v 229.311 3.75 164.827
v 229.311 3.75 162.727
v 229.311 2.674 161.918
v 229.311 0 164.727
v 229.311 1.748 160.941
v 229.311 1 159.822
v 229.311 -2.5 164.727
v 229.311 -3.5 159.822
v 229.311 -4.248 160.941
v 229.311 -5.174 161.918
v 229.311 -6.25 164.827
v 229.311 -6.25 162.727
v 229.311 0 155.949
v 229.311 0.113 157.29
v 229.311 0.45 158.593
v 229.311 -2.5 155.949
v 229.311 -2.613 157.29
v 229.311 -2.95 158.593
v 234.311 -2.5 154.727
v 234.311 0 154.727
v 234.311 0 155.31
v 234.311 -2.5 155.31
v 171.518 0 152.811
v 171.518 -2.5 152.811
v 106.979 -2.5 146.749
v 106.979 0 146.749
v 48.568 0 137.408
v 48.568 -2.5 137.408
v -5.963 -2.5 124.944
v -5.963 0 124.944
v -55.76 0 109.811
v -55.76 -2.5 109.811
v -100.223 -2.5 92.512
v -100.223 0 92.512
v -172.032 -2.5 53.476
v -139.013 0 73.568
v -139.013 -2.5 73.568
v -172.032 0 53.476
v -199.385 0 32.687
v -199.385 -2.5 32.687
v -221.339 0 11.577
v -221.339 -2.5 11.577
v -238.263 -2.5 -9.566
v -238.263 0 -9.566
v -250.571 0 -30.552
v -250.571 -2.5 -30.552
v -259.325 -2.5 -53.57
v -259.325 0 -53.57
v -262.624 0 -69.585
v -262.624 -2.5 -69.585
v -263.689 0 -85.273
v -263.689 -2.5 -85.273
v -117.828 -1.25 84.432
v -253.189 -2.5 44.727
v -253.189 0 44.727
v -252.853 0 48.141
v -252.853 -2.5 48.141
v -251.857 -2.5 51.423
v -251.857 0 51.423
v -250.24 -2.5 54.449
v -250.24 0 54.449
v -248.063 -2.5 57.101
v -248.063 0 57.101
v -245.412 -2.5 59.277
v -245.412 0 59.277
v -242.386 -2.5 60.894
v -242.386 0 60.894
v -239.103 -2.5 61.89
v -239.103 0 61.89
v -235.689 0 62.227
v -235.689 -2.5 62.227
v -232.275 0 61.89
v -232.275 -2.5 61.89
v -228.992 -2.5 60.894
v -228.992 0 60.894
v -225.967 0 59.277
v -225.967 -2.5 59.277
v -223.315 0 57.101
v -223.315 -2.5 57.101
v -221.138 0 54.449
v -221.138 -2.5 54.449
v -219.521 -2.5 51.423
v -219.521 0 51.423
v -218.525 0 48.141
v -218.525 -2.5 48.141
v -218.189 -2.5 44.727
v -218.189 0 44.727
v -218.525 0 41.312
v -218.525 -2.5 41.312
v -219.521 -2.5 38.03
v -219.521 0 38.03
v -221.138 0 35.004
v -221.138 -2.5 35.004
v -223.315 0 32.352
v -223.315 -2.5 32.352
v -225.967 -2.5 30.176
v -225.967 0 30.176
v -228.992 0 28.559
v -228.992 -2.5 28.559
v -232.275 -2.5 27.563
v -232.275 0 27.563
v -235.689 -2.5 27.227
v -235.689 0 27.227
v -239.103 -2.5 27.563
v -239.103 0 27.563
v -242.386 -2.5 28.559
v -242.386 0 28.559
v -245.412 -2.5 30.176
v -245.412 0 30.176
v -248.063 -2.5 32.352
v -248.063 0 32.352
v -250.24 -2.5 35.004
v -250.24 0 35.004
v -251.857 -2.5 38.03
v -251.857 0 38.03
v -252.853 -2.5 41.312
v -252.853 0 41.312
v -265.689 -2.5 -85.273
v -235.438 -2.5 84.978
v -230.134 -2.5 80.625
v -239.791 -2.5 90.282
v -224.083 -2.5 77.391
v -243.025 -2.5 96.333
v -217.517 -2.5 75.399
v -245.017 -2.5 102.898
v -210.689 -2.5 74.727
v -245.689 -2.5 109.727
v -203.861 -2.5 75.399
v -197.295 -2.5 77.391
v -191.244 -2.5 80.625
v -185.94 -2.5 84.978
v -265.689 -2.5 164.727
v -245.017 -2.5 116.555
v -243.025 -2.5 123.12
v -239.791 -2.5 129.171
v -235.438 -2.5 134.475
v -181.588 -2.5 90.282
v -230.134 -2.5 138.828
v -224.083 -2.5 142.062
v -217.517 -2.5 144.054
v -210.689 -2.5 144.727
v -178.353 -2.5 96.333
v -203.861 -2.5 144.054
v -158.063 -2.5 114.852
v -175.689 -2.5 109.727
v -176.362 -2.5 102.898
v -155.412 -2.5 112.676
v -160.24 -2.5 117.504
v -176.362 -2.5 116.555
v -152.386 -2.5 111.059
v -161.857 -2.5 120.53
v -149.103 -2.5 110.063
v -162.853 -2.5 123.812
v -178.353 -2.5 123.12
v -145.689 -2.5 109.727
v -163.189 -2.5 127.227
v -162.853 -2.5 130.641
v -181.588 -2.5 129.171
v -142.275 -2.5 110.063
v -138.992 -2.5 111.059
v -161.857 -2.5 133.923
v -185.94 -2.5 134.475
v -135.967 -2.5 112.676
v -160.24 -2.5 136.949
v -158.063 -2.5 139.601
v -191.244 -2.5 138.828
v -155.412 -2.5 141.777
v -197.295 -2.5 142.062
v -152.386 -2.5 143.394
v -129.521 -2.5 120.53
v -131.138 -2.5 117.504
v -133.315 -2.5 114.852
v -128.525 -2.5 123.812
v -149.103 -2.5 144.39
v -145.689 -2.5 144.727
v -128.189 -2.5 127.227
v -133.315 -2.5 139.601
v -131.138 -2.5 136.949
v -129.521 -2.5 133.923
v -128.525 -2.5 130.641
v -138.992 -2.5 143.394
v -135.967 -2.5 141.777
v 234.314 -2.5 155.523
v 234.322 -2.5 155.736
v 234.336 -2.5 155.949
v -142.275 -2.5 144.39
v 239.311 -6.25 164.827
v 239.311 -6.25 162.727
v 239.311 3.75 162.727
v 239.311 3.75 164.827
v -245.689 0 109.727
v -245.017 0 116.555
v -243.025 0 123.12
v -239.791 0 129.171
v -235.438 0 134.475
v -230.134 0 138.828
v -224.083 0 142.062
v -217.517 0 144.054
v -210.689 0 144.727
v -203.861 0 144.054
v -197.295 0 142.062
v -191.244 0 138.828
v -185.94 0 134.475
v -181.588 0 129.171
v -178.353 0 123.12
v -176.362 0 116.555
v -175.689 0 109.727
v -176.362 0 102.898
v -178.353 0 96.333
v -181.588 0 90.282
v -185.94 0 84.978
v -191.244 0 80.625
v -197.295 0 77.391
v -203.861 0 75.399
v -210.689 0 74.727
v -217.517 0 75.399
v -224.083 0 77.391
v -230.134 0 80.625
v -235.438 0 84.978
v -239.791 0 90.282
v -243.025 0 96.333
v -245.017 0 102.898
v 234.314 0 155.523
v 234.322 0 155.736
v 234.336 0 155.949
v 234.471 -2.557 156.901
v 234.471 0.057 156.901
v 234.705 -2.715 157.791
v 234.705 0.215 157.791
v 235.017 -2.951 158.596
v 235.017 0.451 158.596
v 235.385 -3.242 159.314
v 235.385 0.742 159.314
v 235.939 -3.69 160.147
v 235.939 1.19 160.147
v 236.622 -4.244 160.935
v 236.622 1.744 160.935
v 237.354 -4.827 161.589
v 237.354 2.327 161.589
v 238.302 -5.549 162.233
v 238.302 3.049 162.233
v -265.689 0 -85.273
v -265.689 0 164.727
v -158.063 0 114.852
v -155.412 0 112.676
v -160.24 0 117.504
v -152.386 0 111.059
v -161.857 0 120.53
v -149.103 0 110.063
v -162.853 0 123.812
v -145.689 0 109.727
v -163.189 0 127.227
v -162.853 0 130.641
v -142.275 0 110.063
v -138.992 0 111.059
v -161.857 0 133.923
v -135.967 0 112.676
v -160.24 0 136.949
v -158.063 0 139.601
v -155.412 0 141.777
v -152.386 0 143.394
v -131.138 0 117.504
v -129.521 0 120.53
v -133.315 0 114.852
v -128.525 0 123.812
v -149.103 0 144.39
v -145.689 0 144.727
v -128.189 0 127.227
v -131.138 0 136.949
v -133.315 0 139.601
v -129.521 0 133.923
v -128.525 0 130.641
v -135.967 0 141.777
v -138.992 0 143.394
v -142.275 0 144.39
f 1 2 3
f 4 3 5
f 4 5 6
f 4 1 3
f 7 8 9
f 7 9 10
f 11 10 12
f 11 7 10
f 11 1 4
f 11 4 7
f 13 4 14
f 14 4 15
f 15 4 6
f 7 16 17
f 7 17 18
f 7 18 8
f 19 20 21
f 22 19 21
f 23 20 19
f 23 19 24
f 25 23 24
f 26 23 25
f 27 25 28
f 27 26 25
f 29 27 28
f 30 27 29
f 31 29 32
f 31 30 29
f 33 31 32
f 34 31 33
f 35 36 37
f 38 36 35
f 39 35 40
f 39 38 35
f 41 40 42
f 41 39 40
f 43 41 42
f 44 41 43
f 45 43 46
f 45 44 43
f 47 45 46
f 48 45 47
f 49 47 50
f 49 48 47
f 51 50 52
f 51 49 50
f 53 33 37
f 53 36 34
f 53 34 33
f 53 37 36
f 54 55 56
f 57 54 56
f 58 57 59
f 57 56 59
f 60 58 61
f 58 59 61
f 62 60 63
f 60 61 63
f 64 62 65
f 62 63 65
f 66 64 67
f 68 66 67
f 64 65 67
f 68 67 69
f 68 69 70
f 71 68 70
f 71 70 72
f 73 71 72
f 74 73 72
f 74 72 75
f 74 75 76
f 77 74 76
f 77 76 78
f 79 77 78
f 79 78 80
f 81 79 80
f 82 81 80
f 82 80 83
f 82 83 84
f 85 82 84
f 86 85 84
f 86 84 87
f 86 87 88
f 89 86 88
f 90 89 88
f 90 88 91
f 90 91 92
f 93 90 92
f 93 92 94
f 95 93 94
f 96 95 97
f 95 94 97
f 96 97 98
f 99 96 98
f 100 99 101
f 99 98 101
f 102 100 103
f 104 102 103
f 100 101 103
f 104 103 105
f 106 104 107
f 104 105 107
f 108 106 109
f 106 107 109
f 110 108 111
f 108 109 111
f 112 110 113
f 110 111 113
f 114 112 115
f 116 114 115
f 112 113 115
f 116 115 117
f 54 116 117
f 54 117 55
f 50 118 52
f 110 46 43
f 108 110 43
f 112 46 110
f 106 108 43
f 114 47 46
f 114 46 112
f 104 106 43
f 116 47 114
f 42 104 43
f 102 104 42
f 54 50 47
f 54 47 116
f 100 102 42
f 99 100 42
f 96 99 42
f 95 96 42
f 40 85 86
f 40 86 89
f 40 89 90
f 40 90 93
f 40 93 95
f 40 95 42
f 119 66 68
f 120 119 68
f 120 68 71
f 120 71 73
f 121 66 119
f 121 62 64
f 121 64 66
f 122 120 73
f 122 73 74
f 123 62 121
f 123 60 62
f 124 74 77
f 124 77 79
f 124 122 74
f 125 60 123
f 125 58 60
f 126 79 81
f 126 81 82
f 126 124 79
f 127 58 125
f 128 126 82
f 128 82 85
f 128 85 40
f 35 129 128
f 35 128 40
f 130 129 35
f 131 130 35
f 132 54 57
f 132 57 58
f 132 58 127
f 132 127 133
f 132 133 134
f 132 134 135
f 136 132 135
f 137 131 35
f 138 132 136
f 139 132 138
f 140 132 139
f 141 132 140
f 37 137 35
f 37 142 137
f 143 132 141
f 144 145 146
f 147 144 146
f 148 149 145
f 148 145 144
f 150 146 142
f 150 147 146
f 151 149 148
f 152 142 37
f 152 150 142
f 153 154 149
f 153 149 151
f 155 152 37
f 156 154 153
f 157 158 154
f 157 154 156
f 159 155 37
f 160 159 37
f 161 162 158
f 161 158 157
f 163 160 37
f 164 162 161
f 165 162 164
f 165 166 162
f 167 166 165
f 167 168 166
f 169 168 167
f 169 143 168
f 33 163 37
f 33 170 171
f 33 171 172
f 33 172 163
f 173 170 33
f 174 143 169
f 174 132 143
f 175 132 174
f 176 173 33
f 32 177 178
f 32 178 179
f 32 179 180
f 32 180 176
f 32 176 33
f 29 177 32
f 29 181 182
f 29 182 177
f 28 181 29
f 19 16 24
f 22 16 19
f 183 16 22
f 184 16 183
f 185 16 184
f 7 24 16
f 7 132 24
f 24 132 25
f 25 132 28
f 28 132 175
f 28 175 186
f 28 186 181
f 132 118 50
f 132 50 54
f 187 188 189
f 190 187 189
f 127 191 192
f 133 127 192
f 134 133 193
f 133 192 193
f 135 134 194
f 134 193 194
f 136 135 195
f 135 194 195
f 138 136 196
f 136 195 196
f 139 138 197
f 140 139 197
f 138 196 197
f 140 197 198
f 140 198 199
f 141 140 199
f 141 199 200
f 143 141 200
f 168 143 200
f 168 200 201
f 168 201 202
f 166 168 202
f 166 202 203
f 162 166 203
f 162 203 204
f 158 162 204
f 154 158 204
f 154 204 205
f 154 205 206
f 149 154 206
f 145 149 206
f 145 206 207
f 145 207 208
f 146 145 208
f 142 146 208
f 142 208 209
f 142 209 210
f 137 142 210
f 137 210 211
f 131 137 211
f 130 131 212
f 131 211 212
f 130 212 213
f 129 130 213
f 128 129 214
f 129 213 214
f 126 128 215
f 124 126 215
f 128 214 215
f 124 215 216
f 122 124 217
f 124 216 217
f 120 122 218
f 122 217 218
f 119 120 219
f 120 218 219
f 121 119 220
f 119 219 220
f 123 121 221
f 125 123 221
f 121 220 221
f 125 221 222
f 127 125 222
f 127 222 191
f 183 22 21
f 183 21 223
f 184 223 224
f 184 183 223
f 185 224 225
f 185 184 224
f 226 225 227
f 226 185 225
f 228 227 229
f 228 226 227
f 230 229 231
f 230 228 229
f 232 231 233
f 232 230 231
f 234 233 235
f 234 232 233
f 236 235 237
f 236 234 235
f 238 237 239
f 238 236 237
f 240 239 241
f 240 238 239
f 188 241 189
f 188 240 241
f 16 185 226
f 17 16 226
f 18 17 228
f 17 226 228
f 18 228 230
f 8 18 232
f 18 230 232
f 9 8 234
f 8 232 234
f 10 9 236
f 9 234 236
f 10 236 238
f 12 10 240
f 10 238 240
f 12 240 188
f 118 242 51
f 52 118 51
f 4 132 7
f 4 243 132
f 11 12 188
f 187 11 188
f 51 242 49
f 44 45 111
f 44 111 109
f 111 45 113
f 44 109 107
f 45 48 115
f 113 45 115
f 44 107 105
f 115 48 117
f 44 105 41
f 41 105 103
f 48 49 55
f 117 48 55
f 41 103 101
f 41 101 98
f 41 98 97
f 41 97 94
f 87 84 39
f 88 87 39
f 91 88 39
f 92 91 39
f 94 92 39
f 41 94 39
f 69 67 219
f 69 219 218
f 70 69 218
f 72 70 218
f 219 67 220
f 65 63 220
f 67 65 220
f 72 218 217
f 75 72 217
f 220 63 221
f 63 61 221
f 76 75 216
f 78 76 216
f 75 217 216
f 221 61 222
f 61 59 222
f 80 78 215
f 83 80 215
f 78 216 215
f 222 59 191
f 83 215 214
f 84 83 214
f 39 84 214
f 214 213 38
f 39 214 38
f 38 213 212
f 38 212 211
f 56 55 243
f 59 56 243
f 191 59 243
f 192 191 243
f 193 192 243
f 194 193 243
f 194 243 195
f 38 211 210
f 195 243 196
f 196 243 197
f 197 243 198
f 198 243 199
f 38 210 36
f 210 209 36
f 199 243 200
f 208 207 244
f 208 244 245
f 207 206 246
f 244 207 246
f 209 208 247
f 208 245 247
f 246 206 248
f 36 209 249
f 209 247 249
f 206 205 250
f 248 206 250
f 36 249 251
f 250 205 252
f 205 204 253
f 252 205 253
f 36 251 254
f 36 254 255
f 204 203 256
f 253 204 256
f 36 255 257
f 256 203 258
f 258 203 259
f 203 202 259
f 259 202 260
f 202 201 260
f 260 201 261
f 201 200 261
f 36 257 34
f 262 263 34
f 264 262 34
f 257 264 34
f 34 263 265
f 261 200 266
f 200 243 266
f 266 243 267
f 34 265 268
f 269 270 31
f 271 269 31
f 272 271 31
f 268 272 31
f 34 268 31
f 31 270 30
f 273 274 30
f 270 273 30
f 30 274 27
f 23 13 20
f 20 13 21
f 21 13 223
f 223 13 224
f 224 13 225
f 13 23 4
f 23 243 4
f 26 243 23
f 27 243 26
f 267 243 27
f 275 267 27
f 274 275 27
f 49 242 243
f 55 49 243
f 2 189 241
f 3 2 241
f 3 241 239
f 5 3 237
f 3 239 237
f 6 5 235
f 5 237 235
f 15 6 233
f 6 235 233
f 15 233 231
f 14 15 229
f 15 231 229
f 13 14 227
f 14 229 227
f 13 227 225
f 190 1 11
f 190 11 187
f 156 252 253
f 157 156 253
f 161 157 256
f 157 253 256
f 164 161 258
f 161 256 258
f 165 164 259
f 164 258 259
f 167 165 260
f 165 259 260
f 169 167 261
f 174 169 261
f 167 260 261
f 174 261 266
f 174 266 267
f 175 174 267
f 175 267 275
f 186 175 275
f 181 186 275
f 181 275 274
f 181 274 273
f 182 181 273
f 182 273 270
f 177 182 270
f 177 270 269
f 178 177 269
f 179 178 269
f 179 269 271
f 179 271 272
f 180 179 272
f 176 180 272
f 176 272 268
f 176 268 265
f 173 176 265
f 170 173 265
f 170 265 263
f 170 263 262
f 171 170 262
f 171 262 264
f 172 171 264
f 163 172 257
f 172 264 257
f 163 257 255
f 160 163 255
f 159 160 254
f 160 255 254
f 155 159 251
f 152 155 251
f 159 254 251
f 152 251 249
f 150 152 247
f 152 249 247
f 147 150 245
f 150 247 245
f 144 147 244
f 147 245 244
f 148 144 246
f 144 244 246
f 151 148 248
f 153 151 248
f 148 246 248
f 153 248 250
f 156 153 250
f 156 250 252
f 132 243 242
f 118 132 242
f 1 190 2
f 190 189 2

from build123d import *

# Parameters (mm, degrees)
F1_DEPTH     = 2.5
F3_D         = 70
F4_D         = 35
F5_W         = 5
F5_H         = 2.5
F6_DEPTH     = 2
F7_DEPTH     = 0.1
F8_T1_DEPTH  = 2.5
F8_T3_DEPTH  = 5
F8_T9_DEPTH  = 21.0404962177
F8_T14_DEPTH = 21.9443021397
F8_T22_DEPTH = 21.0404962177
F8_T27_DEPTH = 21.9443021397


# Not quite as in the source:
# - a fillet or chamfer that OpenCascade refuses, or shapes differently, is made with other operations: its cross-section is extruded or revolved along the edge and cut away or added


with BuildPart() as f1:
    # F0 (on Front) → F1 (new body)
    with BuildSketch(Plane.XZ):
        with BuildLine():
            Line((234.3109268695, 164.7265180945), (-265.6890731305, 164.7265180945))
            Line((-265.6890731305, 164.7265180945), (-265.6890731305, -85.2734819055))
            Line((-265.6890731305, -85.2734819055), (-263.6890731305, -85.2734819055))
            add(Edge.make_bspline(
                [(234.3109268695, 154.7265180945), (-263.6890731305, 154.7265180945), (-263.6890731305, -85.2734819055)],
                knots=[4.7123889804, 4.7123889804, 4.7123889804, 6.2831853072, 6.2831853072, 6.2831853072], degree=2, weights=[1, 0.7071067812, 1]))
            Line((234.3109268695, 154.7265180945), (234.3109268695, 164.7265180945))
        make_face()
    extrude(amount=F1_DEPTH)

    # F3 (through all)
    with Locations(Plane.XZ.offset(2.5)):
        with Locations((-210.6890731305, 109.7265180945)):
            Hole(F3_D / 2)

    # F4 (through all)
    with Locations(Plane.XZ.offset(2.5)):
        with Locations((-145.6890731305, 127.2265180945), (-235.6890731305, 44.7265180945)):
            Hole(F4_D / 2)

    # F5 (on face) → F6 (join)
    with BuildSketch(Plane.XY.offset(164.7265180945)):
        Polygon((239.3109268695, -6.25), (239.3109268695, 3.75), (229.3109268695, 3.75), (229.3109268695, 0), (234.3109268695, 0), (234.3109268695, -2.5), (229.3109268695, -2.5), (229.3109268695, -6.25), align=None)
        with Locations((231.8109268695, -1.25)):
            Rectangle(F5_W, F5_H)
    extrude(amount=-F6_DEPTH)

    # F5 (on face) → F7 (join)
    with BuildSketch(Plane.XY.offset(164.7265180945)):
        Polygon((239.3109268695, -6.25), (239.3109268695, 3.75), (229.3109268695, 3.75), (229.3109268695, 0), (234.3109268695, 0), (234.3109268695, -2.5), (229.3109268695, -2.5), (229.3109268695, -6.25), align=None)
        with Locations((231.8109268695, -1.25)):
            Rectangle(F5_W, F5_H)
    extrude(amount=F7_DEPTH)

    # F8: fillet of radius 8 on 3 edges, made by hand

    # F8_s2 → F8_t1 (join)
    with BuildSketch(Plane.XZ):
        with BuildLine():
            ThreePointArc((234.3109268695, 155.3103196074), (235.6776772888, 159.7824555624), (239.3109268695, 162.7265180945))
            Line((239.3109268695, 162.7265180945), (234.3109268695, 162.7265180945))
            Line((234.3109268695, 162.7265180945), (234.3109268695, 155.3103196074))
        make_face()
    extrude(amount=F8_T1_DEPTH)

    # F8_s4 → F8_t3 (join)
    with BuildSketch(Plane.YZ.offset(229.3109268695)):
        with BuildLine():
            ThreePointArc((-2.5, 155.9487972387), (-3.5, 159.8217805849), (-6.25, 162.7265180945))
            Line((-6.25, 162.7265180945), (-2.5, 162.7265180945))
            Line((-2.5, 162.7265180945), (-2.5, 155.9487972387))
        make_face()
        with BuildLine():
            ThreePointArc((3.75, 162.7265180945), (1, 159.8217805849), (0, 155.9487972387))
            Line((0, 155.9487972387), (0, 162.7265180945))
            Line((0, 162.7265180945), (3.75, 162.7265180945))
        make_face()
    extrude(amount=F8_T3_DEPTH)


with BuildPart() as f8_tool7:
    # F8_s8 → F8_t9 (new body)
    with BuildSketch(Plane.XZ.offset(21.0404962177)):
        with BuildLine():
            ThreePointArc((234.3109268695, 155.3103196074), (235.6776772888, 159.7824555624), (239.3109268695, 162.7265180945))
            Line((239.3109268695, 162.7265180945), (234.3109268695, 162.7265180945))
            Line((234.3109268695, 162.7265180945), (234.3109268695, 155.3103196074))
        make_face()
    extrude(amount=-F8_T9_DEPTH)

    split(bisect_by=Plane.XZ.offset(6.25), keep=Keep.BOTTOM)

    split(bisect_by=Plane.XZ.offset(2.5), keep=Keep.TOP)


with BuildPart() as f8_tool12:
    # F8_s13 → F8_t14 (new body)
    with BuildSketch(Plane.YZ.offset(251.2552290092)):
        with BuildLine():
            ThreePointArc((-2.5, 155.9487972387), (-3.5, 159.8217805849), (-6.25, 162.7265180945))
            Line((-6.25, 162.7265180945), (-2.5, 162.7265180945))
            Line((-2.5, 162.7265180945), (-2.5, 155.9487972387))
        make_face()
    extrude(amount=-F8_T14_DEPTH)

    split(bisect_by=Plane.YZ.offset(234.3109268695), keep=Keep.TOP)

    split(bisect_by=Plane.YZ.offset(239.3109268695), keep=Keep.BOTTOM)


with BuildPart() as f8_tool7_1:
    add(f8_tool7.part)

    # F8_t17: intersect F8_tool12
    add(f8_tool12.part, mode=Mode.INTERSECT)


with BuildPart() as f1_1:
    add(f1.part)

    # F8_t5: union F8_tool7
    add(f8_tool7_1.part)


with BuildPart() as f8_tool20:
    # F8_s21 → F8_t22 (new body)
    with BuildSketch(Plane.XZ.offset(2.5)):
        with BuildLine():
            ThreePointArc((234.3109268695, 155.3103196074), (235.6776772888, 159.7824555624), (239.3109268695, 162.7265180945))
            Line((239.3109268695, 162.7265180945), (234.3109268695, 162.7265180945))
            Line((234.3109268695, 162.7265180945), (234.3109268695, 155.3103196074))
        make_face()
    extrude(amount=-F8_T22_DEPTH)

    split(bisect_by=Plane.XZ.offset(-3.75), keep=Keep.TOP)

    split(bisect_by=Plane.XZ, keep=Keep.BOTTOM)


with BuildPart() as f8_tool25:
    # F8_s26 → F8_t27 (new body)
    with BuildSketch(Plane.YZ.offset(251.2552290092)):
        with BuildLine():
            ThreePointArc((3.75, 162.7265180945), (1, 159.8217805849), (0, 155.9487972387))
            Line((0, 155.9487972387), (0, 162.7265180945))
            Line((0, 162.7265180945), (3.75, 162.7265180945))
        make_face()
    extrude(amount=-F8_T27_DEPTH)

    split(bisect_by=Plane.YZ.offset(234.3109268695), keep=Keep.TOP)

    split(bisect_by=Plane.YZ.offset(239.3109268695), keep=Keep.BOTTOM)


with BuildPart() as f8_tool20_1:
    add(f8_tool20.part)

    # F8_t30: intersect F8_tool25
    add(f8_tool25.part, mode=Mode.INTERSECT)


with BuildPart() as f1_2:
    add(f1_1.part)

    # F8_t18: union F8_tool20
    add(f8_tool20_1.part)


solid = f1_2.part
